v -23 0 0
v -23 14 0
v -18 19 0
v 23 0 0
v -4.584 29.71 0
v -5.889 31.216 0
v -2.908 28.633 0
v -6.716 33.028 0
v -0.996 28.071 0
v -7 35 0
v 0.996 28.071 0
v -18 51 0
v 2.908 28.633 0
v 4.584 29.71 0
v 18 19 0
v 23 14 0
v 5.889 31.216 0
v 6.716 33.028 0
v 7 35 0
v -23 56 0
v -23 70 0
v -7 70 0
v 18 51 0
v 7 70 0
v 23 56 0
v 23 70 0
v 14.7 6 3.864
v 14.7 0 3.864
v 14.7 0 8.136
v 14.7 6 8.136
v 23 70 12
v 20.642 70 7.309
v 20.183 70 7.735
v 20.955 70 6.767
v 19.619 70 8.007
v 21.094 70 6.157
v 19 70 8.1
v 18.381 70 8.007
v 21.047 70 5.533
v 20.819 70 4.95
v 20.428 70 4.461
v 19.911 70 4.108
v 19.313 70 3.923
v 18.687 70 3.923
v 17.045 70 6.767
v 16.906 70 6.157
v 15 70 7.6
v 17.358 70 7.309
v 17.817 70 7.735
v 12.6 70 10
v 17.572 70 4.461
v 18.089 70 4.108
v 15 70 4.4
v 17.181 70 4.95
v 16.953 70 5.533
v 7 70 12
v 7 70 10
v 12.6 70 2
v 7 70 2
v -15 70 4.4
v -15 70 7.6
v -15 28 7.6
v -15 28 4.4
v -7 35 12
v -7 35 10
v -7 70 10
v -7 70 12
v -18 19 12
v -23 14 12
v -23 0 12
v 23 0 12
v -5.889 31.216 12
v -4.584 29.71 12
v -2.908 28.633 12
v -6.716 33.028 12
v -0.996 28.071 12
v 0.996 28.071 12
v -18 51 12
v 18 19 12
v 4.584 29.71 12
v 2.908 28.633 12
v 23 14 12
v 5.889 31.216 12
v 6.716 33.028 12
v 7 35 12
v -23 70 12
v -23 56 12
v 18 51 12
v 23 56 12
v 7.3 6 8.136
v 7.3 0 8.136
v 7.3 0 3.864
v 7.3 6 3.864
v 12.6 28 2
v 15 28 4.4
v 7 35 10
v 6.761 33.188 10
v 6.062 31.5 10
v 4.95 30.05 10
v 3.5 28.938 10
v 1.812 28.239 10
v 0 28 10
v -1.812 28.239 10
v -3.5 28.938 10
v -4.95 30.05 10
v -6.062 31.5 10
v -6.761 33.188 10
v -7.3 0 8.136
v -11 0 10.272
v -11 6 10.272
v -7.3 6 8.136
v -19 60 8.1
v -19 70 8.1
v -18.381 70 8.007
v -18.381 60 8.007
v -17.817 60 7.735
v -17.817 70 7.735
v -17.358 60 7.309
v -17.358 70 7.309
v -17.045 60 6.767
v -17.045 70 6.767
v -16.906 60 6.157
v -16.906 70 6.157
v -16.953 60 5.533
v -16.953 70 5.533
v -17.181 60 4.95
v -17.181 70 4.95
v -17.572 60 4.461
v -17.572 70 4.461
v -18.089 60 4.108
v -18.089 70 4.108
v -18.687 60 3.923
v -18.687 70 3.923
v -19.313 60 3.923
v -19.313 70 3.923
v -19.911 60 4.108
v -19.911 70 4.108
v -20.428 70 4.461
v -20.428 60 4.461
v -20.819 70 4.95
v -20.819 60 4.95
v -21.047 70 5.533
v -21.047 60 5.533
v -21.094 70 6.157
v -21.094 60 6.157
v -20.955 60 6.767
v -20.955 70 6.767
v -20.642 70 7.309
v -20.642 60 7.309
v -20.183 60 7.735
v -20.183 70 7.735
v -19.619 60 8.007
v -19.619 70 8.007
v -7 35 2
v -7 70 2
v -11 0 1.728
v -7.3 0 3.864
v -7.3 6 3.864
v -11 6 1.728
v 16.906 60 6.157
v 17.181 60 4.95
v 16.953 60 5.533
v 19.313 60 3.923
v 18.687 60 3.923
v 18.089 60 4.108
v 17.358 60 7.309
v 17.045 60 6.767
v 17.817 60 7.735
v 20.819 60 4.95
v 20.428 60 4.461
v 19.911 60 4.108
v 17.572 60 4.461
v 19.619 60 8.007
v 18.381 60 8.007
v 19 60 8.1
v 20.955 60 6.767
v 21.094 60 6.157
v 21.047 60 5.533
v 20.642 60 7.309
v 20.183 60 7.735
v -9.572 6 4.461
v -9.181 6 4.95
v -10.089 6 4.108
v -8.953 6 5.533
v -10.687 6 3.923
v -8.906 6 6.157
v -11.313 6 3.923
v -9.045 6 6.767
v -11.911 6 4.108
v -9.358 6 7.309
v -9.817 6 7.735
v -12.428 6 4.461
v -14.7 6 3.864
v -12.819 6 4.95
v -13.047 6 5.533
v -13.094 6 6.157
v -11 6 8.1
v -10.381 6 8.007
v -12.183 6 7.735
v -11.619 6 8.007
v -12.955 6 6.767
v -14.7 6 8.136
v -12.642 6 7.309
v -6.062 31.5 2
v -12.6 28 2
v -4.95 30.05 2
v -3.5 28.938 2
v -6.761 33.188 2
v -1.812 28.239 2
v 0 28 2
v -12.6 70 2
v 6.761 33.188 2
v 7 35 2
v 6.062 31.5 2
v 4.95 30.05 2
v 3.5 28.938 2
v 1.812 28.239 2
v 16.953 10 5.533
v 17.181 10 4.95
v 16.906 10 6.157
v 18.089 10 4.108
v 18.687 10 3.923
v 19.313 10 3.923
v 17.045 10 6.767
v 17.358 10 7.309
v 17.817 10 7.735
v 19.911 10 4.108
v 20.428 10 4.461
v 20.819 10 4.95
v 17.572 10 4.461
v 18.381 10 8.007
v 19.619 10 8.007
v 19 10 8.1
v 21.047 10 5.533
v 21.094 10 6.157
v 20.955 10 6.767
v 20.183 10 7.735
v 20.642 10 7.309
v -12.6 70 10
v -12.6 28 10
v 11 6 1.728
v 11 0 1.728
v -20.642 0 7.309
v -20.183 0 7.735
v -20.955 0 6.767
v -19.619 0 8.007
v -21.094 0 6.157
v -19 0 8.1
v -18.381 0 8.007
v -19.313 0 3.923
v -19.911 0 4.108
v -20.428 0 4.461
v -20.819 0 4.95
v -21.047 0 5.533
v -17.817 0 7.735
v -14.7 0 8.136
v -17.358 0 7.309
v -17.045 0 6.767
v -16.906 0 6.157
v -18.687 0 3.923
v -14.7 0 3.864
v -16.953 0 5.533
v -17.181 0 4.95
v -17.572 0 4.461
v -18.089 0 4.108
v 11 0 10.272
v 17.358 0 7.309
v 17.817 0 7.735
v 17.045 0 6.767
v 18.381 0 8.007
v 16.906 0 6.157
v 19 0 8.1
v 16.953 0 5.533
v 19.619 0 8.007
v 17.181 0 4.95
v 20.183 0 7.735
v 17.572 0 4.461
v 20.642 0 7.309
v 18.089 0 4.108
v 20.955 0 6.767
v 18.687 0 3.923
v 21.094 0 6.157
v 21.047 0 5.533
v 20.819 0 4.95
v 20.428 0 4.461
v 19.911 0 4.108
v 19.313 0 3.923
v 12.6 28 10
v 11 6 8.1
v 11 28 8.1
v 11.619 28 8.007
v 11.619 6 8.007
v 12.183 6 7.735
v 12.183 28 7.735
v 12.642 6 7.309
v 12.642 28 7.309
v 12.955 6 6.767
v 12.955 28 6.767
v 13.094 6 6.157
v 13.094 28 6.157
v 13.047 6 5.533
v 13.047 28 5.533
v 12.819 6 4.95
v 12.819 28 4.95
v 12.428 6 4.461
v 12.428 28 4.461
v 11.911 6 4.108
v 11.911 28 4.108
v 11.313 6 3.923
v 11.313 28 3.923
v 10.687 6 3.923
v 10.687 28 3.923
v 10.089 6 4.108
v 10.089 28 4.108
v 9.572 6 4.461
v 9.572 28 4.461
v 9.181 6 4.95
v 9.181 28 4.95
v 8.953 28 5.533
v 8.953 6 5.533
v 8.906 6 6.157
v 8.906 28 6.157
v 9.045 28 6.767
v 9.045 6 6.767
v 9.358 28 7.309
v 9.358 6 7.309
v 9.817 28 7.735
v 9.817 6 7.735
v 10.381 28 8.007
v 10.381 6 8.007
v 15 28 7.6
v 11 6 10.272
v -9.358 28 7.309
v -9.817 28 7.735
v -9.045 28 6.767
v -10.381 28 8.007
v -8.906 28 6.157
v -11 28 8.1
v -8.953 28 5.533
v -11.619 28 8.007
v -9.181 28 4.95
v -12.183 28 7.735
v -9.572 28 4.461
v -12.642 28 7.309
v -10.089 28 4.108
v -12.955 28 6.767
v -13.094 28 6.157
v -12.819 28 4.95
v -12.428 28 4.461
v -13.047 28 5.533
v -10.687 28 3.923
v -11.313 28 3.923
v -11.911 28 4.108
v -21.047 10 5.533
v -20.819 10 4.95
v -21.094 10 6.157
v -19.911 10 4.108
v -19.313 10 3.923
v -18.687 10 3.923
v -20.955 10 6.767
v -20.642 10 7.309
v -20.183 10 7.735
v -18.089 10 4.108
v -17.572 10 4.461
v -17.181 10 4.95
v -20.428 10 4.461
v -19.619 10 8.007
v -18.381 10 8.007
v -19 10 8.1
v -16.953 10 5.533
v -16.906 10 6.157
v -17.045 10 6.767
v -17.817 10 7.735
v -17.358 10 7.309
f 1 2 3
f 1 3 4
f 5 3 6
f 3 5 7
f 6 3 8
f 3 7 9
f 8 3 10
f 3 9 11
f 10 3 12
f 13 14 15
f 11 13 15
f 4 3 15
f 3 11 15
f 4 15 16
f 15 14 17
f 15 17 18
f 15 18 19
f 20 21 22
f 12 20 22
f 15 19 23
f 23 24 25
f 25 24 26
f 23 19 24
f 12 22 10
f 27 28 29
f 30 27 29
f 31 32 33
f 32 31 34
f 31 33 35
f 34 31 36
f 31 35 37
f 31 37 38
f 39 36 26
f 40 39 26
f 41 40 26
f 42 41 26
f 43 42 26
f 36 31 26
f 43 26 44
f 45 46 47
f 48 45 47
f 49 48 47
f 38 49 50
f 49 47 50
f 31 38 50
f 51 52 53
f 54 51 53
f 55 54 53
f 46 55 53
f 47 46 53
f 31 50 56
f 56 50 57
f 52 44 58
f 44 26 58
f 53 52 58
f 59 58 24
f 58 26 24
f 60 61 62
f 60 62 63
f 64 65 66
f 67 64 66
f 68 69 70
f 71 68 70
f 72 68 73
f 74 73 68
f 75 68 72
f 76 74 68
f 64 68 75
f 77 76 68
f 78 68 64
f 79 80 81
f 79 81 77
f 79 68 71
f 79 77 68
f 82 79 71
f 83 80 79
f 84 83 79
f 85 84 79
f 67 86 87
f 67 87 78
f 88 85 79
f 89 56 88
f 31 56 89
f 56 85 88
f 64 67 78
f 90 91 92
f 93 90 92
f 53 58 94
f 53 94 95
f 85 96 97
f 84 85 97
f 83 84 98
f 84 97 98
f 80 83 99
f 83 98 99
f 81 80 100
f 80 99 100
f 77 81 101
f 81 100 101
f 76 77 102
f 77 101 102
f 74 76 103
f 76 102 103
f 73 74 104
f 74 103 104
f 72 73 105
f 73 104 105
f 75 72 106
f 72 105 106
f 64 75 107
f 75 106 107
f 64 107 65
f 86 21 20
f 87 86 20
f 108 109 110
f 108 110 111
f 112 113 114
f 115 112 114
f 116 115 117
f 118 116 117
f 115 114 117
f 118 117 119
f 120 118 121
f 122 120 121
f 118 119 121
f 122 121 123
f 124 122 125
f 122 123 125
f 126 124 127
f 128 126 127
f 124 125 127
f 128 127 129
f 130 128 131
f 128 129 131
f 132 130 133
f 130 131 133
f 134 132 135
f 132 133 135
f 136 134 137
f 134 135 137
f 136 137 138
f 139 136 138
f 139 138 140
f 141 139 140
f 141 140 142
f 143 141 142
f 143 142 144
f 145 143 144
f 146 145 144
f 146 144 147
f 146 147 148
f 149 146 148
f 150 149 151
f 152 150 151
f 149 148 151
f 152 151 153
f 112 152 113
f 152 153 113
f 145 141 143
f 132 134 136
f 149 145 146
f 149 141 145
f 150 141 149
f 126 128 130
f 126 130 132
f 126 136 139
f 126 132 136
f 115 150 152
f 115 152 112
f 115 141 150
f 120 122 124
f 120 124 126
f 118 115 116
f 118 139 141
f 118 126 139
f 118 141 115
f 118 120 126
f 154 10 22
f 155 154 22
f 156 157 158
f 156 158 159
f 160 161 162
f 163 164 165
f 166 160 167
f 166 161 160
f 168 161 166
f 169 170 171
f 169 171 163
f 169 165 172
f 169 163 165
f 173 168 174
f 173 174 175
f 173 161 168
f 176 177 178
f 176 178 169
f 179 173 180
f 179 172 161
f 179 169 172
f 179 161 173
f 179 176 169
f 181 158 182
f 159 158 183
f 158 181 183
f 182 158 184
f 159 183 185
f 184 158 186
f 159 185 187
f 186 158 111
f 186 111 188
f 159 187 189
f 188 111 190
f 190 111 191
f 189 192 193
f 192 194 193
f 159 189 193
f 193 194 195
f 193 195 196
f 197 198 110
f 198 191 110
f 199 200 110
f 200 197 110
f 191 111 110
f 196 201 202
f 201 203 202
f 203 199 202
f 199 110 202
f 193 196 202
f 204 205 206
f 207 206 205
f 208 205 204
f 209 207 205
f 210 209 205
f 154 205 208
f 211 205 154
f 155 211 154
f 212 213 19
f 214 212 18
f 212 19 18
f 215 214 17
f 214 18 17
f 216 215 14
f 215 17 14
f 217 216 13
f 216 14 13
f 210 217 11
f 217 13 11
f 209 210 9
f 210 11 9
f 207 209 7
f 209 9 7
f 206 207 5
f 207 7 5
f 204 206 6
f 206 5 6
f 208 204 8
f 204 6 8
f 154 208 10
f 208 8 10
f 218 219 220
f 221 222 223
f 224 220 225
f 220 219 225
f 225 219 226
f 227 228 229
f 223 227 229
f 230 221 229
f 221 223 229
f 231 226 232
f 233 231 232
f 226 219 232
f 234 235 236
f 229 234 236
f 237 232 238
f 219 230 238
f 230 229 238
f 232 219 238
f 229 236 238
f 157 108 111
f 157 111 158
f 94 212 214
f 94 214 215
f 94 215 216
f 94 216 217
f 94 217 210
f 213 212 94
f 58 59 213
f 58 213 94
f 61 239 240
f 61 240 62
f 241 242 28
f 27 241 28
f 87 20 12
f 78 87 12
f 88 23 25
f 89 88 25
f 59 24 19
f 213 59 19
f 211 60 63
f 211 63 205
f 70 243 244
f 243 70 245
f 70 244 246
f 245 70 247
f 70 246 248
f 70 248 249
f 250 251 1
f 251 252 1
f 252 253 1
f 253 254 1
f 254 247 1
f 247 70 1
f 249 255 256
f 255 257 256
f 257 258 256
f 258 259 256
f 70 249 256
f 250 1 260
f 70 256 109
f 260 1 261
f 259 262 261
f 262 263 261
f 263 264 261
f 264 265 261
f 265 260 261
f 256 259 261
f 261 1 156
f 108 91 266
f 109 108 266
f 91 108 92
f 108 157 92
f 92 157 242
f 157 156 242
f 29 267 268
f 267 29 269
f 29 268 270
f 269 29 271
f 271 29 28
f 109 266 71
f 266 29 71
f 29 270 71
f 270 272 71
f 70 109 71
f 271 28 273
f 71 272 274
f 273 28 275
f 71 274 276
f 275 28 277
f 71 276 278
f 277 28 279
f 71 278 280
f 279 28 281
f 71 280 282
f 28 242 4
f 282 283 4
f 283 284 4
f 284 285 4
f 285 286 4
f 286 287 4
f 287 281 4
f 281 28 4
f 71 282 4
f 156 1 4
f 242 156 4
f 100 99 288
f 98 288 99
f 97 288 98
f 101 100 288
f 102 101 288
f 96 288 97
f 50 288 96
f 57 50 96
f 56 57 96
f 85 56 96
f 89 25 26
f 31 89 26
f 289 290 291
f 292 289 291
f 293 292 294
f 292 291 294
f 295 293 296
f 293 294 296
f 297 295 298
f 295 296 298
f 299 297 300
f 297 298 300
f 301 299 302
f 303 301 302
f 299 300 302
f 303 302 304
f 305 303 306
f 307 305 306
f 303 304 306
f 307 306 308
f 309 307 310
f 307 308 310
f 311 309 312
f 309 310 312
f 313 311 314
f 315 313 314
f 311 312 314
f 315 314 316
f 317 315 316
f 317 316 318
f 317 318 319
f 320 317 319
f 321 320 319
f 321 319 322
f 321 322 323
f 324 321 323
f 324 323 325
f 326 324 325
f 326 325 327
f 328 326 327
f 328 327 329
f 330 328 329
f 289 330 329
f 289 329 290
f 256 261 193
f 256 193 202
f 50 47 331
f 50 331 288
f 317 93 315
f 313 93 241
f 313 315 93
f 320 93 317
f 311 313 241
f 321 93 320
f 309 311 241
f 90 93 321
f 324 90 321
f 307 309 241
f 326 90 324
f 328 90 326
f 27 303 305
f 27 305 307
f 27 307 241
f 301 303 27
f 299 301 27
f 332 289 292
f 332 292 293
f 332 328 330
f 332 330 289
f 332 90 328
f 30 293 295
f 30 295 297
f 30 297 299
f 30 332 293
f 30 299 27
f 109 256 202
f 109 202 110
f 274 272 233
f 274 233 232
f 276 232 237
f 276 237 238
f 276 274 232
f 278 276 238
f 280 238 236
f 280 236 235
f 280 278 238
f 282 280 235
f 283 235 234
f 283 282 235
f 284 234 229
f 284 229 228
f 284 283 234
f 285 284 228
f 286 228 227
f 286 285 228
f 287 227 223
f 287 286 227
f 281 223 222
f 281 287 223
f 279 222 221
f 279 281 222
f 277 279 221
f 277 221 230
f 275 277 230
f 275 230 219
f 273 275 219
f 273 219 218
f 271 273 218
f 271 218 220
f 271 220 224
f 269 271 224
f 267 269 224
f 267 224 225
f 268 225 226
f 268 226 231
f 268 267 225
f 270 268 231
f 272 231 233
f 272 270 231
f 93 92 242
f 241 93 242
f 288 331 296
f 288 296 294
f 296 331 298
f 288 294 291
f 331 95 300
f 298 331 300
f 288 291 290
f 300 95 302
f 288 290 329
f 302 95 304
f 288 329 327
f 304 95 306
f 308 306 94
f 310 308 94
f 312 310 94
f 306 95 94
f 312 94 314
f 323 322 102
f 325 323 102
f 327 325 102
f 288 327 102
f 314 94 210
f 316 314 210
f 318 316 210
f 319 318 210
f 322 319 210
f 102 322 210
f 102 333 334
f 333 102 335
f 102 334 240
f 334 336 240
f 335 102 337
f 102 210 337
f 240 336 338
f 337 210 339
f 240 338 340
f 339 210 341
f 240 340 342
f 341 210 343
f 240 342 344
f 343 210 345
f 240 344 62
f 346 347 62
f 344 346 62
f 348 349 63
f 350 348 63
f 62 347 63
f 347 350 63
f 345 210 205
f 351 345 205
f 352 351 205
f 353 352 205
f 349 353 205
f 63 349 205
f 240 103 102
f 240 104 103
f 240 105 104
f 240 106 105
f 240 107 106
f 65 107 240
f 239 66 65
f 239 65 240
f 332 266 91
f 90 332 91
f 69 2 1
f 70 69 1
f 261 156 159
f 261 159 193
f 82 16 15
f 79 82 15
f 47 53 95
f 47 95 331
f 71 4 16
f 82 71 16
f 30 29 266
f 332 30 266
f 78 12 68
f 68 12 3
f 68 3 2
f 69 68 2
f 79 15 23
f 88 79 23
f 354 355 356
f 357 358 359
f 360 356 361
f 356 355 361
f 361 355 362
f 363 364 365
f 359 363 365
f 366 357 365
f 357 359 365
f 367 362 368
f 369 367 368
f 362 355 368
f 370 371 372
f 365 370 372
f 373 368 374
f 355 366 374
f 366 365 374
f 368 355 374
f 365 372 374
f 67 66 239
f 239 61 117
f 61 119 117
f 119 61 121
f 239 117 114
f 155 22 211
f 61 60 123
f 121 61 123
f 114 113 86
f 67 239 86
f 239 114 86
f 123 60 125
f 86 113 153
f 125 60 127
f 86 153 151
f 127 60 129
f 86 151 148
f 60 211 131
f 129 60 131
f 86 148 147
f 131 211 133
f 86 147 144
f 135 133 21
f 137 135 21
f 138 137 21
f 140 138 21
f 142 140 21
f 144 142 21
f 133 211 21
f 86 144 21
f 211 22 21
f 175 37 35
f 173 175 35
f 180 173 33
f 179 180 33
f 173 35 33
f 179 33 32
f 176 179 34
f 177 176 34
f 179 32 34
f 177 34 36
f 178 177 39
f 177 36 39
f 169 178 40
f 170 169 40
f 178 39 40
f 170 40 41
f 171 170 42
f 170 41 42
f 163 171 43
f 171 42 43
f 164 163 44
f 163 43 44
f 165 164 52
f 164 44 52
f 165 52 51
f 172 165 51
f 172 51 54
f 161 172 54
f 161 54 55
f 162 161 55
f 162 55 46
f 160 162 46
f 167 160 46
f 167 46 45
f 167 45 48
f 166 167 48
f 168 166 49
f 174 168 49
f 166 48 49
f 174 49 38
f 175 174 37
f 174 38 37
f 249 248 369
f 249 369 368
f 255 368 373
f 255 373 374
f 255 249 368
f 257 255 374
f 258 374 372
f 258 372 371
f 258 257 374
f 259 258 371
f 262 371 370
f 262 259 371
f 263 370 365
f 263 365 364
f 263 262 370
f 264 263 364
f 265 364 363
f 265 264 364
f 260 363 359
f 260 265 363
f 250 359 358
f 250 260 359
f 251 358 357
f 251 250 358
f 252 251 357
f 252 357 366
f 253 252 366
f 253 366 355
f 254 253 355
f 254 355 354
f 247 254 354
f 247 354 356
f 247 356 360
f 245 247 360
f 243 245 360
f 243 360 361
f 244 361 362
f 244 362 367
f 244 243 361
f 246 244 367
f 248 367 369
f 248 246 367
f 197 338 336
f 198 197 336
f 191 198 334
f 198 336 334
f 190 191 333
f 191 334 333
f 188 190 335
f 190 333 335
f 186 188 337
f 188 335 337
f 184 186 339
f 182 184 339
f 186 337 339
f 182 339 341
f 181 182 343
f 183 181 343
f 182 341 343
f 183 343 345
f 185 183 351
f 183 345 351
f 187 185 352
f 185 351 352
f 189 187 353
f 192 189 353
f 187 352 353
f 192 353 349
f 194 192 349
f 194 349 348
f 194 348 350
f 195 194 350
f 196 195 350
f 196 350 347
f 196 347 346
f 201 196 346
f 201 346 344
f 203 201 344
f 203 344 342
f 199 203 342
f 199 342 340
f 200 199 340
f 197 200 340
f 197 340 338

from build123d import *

# Parameters (mm, degrees)
DODANIE_WYCI_GNI_CIE1_DEPTH = 12
SZKIC2_R                    = 2.1
WYTNIJ_WYCI_GNI_CIE1_DEPTH  = 10
WYTNIJ_WYCI_GNI_CIE2_DEPTH  = 42
WYTNIJ_WYCI_GNI_CIE3_REACH  = 51.366
SZKIC4_R                    = 2.1
WYTNIJ_WYCI_GNI_CIE4_DEPTH  = 6


with BuildPart() as part:
    # Szkic1 → Dodanie-wyciągnięcie1 (new body)
    with BuildSketch(Plane.XY):
        with BuildLine():
            Line((-23, 0), (23, 0))
            Line((23, 0), (23, 14))
            Line((23, 14), (18, 19))
            Line((18, 19), (18, 51))
            Line((18, 51), (23, 56))
            Line((23, 56), (23, 70))
            Line((23, 70), (7, 70))
            Line((7, 70), (7, 35))
            ThreePointArc((7, 35), (0, 28), (-7, 35))
            Line((-7, 35), (-7, 70))
            Line((-7, 70), (-23, 70))
            Line((-23, 70), (-23, 56))
            Line((-23, 56), (-18, 51))
            Line((-18, 51), (-18, 19))
            Line((-18, 19), (-23, 14))
            Line((-23, 14), (-23, 0))
        make_face()
    extrude(amount=DODANIE_WYCI_GNI_CIE1_DEPTH)

    # Szkic2 → Wytnij-wyciągnięcie1 (cut)
    with BuildSketch(Plane(origin=(0, 70, 0), x_dir=(1, 0, 0), z_dir=(0, 1, 0))):
        with Locations(Location((-19, -6, 0), (0, 0, 270))):
            Circle(SZKIC2_R)
        with Locations(Location((19, -6, 0), (0, 0, 270))):
            Circle(SZKIC2_R)
    wytnij_wyci_gni_cie1 = extrude(amount=-WYTNIJ_WYCI_GNI_CIE1_DEPTH, mode=Mode.SUBTRACT)

    # Lustro1: Wytnij-wyciągnięcie1 across plane
    add(wytnij_wyci_gni_cie1.mirror(Plane(origin=(0, 35, 0), x_dir=(0, 0, 1), z_dir=(0, -1, 0))), mode=Mode.SUBTRACT)

    # Szkic3 → Wytnij-wyciągnięcie2 (cut)
    with BuildSketch(Plane(origin=(0, 70, 0), x_dir=(-1, 0, 0), z_dir=(0, -1, 0))):
        Polygon((12.6, -2), (-12.6, -2), (-15, -4.4), (-15, -7.6), (-12.6, -10), (12.6, -10), (15, -7.6), (15, -4.4), align=None)
    extrude(amount=WYTNIJ_WYCI_GNI_CIE2_DEPTH, mode=Mode.SUBTRACT)

    # Szkic4 → Wytnij-wyciągnięcie3 (cut, up to next)
    with BuildSketch(Plane(origin=(0, 28, 0), x_dir=(1, 0, 0), z_dir=(0, 1, 0)), mode=Mode.PRIVATE) as wytnij_wyci_gni_cie3_sk1:
        with Locations(Location((11, -6, 0), (0, 0, 270))):
            Circle(SZKIC4_R)
    wytnij_wyci_gni_cie3_tool1 = extrude(wytnij_wyci_gni_cie3_sk1.sketch, amount=-WYTNIJ_WYCI_GNI_CIE3_REACH, mode=Mode.PRIVATE) & part.part
    # Szkic4 → Wytnij-wyciągnięcie3 (cut, up to next)
    with BuildSketch(Plane(origin=(0, 28, 0), x_dir=(1, 0, 0), z_dir=(0, 1, 0)), mode=Mode.PRIVATE) as wytnij_wyci_gni_cie3_sk2:
        with Locations(Location((-11, -6, 0), (0, 0, 270))):
            Circle(SZKIC4_R)
    wytnij_wyci_gni_cie3_tool2 = extrude(wytnij_wyci_gni_cie3_sk2.sketch, amount=-WYTNIJ_WYCI_GNI_CIE3_REACH, mode=Mode.PRIVATE) & part.part
    add(wytnij_wyci_gni_cie3_tool1.solids().sort_by_distance((11, 28, 6))[0], mode=Mode.SUBTRACT)
    add(wytnij_wyci_gni_cie3_tool2.solids().sort_by_distance((-11, 28, 6))[0], mode=Mode.SUBTRACT)

    # Szkic5 → Wytnij-wyciągnięcie4 (cut)
    with BuildSketch(Plane.XZ):
        Polygon((11, 1.727608008), (14.7, 3.863804004), (14.7, 8.136195996), (11, 10.272391992), (7.3, 8.136195996), (7.3, 3.863804004), align=None)
        Polygon((-7.3, 3.863804004), (-11, 1.727608008), (-14.7, 3.863804004), (-14.7, 8.136195996), (-11, 10.272391992), (-7.3, 8.136195996), align=None)
    extrude(amount=-WYTNIJ_WYCI_GNI_CIE4_DEPTH, mode=Mode.SUBTRACT)


solid = part.part
